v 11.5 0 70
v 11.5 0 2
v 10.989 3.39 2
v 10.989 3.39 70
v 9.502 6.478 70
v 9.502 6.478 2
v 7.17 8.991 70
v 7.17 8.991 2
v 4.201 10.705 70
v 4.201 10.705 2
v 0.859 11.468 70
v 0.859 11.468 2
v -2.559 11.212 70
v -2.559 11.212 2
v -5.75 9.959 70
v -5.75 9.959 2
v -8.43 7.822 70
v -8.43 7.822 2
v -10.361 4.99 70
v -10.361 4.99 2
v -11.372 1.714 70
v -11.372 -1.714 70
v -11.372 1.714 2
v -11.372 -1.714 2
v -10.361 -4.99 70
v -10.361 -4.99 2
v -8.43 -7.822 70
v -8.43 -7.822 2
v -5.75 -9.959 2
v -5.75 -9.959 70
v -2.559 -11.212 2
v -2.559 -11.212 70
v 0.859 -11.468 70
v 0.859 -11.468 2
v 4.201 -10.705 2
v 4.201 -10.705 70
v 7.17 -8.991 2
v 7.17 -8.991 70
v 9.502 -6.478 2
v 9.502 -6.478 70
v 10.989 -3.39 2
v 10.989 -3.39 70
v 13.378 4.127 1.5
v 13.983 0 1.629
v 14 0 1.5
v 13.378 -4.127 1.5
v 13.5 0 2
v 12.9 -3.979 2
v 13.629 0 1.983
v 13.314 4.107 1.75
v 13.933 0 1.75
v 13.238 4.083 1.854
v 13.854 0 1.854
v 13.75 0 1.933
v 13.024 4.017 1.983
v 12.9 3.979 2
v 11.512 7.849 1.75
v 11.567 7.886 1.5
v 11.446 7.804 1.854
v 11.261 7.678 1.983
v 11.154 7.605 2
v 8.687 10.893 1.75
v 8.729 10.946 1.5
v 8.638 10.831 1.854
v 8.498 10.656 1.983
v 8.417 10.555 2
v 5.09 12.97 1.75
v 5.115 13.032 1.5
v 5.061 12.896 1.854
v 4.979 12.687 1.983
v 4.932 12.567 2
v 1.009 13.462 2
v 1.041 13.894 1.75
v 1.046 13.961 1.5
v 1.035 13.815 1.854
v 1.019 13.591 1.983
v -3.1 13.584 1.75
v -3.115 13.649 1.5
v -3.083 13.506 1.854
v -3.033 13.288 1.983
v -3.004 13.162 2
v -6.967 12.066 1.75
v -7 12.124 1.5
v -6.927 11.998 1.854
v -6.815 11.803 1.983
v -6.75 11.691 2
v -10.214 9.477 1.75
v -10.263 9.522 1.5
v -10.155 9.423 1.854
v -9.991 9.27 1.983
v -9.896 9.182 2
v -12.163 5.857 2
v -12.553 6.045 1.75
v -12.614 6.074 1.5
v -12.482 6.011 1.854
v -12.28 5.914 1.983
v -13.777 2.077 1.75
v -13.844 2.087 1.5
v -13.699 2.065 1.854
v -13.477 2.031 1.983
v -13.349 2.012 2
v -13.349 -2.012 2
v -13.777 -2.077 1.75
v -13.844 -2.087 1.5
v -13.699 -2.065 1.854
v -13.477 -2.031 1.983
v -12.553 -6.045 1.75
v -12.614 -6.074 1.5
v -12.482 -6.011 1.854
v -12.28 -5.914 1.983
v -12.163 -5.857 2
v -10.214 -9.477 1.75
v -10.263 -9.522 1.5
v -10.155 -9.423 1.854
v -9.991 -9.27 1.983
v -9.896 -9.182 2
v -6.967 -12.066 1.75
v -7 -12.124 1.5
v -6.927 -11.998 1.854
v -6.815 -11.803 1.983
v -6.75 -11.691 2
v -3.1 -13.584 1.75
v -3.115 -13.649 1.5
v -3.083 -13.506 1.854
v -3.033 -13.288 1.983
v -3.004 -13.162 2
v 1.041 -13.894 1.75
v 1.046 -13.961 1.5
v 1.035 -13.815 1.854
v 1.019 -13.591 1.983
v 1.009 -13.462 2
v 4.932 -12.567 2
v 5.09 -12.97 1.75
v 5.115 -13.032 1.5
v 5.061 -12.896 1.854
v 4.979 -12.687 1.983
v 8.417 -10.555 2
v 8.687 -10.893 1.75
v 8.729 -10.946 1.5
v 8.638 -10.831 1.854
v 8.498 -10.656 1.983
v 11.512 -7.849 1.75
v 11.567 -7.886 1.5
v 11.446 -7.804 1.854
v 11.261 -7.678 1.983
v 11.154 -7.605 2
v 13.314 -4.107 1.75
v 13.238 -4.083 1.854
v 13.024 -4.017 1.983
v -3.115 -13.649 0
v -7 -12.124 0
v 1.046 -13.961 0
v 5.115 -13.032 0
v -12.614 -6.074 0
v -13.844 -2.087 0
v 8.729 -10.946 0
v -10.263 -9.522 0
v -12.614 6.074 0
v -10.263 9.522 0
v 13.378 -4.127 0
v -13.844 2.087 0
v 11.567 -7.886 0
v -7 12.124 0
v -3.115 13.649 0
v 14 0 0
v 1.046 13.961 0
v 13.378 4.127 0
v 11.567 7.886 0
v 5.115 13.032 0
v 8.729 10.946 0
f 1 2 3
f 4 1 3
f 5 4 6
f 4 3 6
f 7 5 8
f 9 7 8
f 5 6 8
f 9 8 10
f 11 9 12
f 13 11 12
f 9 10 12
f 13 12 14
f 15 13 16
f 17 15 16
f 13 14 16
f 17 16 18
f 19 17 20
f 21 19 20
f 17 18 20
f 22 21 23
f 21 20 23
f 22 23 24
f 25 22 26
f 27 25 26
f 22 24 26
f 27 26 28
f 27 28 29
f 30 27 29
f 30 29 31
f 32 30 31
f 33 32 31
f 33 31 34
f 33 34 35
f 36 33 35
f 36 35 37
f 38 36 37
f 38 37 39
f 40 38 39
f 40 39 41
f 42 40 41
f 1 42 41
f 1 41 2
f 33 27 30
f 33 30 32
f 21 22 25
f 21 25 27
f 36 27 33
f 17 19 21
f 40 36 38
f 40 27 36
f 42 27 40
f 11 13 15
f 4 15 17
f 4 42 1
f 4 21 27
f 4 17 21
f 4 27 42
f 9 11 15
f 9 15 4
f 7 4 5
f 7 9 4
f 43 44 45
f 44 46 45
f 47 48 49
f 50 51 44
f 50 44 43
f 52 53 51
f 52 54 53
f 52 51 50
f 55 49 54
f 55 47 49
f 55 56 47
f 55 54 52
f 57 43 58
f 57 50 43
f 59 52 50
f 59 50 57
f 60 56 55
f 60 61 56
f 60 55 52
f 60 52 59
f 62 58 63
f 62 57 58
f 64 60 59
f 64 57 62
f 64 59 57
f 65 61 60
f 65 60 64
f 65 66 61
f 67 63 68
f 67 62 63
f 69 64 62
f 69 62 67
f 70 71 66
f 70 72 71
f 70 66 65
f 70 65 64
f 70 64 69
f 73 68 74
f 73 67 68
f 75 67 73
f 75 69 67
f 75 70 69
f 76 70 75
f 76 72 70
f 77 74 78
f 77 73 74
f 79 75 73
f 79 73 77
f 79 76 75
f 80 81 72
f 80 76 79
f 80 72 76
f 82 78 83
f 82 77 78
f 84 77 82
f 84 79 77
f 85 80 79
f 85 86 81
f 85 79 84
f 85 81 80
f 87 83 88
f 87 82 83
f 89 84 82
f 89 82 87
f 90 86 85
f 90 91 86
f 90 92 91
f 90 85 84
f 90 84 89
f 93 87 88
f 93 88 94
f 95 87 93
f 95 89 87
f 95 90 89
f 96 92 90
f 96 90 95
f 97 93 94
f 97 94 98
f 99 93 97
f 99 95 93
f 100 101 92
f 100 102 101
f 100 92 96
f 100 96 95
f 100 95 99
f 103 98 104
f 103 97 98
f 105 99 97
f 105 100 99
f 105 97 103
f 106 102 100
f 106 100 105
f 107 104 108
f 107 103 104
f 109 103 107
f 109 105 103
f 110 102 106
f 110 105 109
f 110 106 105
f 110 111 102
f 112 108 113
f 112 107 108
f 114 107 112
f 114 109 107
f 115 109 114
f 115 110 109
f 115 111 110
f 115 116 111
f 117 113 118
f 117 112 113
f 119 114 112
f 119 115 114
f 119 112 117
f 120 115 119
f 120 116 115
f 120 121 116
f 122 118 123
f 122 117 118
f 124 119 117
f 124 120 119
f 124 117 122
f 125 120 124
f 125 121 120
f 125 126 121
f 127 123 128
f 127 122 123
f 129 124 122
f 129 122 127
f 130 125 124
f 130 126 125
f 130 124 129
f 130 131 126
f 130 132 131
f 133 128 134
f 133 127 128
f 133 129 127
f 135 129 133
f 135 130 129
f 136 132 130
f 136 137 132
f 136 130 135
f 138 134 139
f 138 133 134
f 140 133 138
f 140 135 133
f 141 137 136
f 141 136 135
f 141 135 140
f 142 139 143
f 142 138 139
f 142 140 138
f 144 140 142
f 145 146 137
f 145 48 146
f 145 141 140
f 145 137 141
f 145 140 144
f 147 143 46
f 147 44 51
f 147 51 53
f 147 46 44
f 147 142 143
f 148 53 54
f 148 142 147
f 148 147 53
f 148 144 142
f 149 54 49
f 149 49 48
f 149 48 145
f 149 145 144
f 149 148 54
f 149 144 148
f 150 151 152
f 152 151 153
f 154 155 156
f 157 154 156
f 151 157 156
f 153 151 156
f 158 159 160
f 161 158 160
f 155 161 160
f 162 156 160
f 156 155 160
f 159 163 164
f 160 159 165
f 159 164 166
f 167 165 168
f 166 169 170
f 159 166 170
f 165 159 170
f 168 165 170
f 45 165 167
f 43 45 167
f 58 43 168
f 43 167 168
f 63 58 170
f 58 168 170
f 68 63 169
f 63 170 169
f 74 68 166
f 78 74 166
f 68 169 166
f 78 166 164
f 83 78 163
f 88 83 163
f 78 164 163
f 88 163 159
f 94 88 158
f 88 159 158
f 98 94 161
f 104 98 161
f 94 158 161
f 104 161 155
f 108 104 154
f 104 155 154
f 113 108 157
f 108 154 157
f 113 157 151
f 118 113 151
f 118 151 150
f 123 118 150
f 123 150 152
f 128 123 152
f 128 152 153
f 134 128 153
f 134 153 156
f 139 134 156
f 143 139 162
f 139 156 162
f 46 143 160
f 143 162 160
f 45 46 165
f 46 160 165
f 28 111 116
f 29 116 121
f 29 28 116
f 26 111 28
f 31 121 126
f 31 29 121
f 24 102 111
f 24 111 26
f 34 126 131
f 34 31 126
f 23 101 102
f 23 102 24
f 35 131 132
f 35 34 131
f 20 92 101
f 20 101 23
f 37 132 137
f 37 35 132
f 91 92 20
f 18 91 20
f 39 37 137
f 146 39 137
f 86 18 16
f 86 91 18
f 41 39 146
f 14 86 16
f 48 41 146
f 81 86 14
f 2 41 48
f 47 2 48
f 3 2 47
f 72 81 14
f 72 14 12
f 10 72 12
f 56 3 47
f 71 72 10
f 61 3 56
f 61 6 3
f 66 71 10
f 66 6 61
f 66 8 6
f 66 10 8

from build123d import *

# Parameters (mm, degrees)
F0_R     = 11.5
F1_DEPTH = 70
F0_R_2   = 14
F2_DEPTH = 2
F3_R     = 0.5


with BuildPart() as f1:
    # F0 (on Top) → F1 (new body)
    with BuildSketch(Plane.XY):
        Circle(F0_R)
    extrude(amount=F1_DEPTH)

    # F0 (on Top) → F2 (join)
    with BuildSketch(Plane.XY):
        Circle(F0_R_2)
        Circle(F0_R, mode=Mode.SUBTRACT)
    extrude(amount=F2_DEPTH)

    # F3
    f3_edges = [f1.edges().sort_by_distance(p)[0] for p in [
        (-14, 0, 2),
    ]]
    fillet(f3_edges, radius=F3_R)


solid = f1.part
